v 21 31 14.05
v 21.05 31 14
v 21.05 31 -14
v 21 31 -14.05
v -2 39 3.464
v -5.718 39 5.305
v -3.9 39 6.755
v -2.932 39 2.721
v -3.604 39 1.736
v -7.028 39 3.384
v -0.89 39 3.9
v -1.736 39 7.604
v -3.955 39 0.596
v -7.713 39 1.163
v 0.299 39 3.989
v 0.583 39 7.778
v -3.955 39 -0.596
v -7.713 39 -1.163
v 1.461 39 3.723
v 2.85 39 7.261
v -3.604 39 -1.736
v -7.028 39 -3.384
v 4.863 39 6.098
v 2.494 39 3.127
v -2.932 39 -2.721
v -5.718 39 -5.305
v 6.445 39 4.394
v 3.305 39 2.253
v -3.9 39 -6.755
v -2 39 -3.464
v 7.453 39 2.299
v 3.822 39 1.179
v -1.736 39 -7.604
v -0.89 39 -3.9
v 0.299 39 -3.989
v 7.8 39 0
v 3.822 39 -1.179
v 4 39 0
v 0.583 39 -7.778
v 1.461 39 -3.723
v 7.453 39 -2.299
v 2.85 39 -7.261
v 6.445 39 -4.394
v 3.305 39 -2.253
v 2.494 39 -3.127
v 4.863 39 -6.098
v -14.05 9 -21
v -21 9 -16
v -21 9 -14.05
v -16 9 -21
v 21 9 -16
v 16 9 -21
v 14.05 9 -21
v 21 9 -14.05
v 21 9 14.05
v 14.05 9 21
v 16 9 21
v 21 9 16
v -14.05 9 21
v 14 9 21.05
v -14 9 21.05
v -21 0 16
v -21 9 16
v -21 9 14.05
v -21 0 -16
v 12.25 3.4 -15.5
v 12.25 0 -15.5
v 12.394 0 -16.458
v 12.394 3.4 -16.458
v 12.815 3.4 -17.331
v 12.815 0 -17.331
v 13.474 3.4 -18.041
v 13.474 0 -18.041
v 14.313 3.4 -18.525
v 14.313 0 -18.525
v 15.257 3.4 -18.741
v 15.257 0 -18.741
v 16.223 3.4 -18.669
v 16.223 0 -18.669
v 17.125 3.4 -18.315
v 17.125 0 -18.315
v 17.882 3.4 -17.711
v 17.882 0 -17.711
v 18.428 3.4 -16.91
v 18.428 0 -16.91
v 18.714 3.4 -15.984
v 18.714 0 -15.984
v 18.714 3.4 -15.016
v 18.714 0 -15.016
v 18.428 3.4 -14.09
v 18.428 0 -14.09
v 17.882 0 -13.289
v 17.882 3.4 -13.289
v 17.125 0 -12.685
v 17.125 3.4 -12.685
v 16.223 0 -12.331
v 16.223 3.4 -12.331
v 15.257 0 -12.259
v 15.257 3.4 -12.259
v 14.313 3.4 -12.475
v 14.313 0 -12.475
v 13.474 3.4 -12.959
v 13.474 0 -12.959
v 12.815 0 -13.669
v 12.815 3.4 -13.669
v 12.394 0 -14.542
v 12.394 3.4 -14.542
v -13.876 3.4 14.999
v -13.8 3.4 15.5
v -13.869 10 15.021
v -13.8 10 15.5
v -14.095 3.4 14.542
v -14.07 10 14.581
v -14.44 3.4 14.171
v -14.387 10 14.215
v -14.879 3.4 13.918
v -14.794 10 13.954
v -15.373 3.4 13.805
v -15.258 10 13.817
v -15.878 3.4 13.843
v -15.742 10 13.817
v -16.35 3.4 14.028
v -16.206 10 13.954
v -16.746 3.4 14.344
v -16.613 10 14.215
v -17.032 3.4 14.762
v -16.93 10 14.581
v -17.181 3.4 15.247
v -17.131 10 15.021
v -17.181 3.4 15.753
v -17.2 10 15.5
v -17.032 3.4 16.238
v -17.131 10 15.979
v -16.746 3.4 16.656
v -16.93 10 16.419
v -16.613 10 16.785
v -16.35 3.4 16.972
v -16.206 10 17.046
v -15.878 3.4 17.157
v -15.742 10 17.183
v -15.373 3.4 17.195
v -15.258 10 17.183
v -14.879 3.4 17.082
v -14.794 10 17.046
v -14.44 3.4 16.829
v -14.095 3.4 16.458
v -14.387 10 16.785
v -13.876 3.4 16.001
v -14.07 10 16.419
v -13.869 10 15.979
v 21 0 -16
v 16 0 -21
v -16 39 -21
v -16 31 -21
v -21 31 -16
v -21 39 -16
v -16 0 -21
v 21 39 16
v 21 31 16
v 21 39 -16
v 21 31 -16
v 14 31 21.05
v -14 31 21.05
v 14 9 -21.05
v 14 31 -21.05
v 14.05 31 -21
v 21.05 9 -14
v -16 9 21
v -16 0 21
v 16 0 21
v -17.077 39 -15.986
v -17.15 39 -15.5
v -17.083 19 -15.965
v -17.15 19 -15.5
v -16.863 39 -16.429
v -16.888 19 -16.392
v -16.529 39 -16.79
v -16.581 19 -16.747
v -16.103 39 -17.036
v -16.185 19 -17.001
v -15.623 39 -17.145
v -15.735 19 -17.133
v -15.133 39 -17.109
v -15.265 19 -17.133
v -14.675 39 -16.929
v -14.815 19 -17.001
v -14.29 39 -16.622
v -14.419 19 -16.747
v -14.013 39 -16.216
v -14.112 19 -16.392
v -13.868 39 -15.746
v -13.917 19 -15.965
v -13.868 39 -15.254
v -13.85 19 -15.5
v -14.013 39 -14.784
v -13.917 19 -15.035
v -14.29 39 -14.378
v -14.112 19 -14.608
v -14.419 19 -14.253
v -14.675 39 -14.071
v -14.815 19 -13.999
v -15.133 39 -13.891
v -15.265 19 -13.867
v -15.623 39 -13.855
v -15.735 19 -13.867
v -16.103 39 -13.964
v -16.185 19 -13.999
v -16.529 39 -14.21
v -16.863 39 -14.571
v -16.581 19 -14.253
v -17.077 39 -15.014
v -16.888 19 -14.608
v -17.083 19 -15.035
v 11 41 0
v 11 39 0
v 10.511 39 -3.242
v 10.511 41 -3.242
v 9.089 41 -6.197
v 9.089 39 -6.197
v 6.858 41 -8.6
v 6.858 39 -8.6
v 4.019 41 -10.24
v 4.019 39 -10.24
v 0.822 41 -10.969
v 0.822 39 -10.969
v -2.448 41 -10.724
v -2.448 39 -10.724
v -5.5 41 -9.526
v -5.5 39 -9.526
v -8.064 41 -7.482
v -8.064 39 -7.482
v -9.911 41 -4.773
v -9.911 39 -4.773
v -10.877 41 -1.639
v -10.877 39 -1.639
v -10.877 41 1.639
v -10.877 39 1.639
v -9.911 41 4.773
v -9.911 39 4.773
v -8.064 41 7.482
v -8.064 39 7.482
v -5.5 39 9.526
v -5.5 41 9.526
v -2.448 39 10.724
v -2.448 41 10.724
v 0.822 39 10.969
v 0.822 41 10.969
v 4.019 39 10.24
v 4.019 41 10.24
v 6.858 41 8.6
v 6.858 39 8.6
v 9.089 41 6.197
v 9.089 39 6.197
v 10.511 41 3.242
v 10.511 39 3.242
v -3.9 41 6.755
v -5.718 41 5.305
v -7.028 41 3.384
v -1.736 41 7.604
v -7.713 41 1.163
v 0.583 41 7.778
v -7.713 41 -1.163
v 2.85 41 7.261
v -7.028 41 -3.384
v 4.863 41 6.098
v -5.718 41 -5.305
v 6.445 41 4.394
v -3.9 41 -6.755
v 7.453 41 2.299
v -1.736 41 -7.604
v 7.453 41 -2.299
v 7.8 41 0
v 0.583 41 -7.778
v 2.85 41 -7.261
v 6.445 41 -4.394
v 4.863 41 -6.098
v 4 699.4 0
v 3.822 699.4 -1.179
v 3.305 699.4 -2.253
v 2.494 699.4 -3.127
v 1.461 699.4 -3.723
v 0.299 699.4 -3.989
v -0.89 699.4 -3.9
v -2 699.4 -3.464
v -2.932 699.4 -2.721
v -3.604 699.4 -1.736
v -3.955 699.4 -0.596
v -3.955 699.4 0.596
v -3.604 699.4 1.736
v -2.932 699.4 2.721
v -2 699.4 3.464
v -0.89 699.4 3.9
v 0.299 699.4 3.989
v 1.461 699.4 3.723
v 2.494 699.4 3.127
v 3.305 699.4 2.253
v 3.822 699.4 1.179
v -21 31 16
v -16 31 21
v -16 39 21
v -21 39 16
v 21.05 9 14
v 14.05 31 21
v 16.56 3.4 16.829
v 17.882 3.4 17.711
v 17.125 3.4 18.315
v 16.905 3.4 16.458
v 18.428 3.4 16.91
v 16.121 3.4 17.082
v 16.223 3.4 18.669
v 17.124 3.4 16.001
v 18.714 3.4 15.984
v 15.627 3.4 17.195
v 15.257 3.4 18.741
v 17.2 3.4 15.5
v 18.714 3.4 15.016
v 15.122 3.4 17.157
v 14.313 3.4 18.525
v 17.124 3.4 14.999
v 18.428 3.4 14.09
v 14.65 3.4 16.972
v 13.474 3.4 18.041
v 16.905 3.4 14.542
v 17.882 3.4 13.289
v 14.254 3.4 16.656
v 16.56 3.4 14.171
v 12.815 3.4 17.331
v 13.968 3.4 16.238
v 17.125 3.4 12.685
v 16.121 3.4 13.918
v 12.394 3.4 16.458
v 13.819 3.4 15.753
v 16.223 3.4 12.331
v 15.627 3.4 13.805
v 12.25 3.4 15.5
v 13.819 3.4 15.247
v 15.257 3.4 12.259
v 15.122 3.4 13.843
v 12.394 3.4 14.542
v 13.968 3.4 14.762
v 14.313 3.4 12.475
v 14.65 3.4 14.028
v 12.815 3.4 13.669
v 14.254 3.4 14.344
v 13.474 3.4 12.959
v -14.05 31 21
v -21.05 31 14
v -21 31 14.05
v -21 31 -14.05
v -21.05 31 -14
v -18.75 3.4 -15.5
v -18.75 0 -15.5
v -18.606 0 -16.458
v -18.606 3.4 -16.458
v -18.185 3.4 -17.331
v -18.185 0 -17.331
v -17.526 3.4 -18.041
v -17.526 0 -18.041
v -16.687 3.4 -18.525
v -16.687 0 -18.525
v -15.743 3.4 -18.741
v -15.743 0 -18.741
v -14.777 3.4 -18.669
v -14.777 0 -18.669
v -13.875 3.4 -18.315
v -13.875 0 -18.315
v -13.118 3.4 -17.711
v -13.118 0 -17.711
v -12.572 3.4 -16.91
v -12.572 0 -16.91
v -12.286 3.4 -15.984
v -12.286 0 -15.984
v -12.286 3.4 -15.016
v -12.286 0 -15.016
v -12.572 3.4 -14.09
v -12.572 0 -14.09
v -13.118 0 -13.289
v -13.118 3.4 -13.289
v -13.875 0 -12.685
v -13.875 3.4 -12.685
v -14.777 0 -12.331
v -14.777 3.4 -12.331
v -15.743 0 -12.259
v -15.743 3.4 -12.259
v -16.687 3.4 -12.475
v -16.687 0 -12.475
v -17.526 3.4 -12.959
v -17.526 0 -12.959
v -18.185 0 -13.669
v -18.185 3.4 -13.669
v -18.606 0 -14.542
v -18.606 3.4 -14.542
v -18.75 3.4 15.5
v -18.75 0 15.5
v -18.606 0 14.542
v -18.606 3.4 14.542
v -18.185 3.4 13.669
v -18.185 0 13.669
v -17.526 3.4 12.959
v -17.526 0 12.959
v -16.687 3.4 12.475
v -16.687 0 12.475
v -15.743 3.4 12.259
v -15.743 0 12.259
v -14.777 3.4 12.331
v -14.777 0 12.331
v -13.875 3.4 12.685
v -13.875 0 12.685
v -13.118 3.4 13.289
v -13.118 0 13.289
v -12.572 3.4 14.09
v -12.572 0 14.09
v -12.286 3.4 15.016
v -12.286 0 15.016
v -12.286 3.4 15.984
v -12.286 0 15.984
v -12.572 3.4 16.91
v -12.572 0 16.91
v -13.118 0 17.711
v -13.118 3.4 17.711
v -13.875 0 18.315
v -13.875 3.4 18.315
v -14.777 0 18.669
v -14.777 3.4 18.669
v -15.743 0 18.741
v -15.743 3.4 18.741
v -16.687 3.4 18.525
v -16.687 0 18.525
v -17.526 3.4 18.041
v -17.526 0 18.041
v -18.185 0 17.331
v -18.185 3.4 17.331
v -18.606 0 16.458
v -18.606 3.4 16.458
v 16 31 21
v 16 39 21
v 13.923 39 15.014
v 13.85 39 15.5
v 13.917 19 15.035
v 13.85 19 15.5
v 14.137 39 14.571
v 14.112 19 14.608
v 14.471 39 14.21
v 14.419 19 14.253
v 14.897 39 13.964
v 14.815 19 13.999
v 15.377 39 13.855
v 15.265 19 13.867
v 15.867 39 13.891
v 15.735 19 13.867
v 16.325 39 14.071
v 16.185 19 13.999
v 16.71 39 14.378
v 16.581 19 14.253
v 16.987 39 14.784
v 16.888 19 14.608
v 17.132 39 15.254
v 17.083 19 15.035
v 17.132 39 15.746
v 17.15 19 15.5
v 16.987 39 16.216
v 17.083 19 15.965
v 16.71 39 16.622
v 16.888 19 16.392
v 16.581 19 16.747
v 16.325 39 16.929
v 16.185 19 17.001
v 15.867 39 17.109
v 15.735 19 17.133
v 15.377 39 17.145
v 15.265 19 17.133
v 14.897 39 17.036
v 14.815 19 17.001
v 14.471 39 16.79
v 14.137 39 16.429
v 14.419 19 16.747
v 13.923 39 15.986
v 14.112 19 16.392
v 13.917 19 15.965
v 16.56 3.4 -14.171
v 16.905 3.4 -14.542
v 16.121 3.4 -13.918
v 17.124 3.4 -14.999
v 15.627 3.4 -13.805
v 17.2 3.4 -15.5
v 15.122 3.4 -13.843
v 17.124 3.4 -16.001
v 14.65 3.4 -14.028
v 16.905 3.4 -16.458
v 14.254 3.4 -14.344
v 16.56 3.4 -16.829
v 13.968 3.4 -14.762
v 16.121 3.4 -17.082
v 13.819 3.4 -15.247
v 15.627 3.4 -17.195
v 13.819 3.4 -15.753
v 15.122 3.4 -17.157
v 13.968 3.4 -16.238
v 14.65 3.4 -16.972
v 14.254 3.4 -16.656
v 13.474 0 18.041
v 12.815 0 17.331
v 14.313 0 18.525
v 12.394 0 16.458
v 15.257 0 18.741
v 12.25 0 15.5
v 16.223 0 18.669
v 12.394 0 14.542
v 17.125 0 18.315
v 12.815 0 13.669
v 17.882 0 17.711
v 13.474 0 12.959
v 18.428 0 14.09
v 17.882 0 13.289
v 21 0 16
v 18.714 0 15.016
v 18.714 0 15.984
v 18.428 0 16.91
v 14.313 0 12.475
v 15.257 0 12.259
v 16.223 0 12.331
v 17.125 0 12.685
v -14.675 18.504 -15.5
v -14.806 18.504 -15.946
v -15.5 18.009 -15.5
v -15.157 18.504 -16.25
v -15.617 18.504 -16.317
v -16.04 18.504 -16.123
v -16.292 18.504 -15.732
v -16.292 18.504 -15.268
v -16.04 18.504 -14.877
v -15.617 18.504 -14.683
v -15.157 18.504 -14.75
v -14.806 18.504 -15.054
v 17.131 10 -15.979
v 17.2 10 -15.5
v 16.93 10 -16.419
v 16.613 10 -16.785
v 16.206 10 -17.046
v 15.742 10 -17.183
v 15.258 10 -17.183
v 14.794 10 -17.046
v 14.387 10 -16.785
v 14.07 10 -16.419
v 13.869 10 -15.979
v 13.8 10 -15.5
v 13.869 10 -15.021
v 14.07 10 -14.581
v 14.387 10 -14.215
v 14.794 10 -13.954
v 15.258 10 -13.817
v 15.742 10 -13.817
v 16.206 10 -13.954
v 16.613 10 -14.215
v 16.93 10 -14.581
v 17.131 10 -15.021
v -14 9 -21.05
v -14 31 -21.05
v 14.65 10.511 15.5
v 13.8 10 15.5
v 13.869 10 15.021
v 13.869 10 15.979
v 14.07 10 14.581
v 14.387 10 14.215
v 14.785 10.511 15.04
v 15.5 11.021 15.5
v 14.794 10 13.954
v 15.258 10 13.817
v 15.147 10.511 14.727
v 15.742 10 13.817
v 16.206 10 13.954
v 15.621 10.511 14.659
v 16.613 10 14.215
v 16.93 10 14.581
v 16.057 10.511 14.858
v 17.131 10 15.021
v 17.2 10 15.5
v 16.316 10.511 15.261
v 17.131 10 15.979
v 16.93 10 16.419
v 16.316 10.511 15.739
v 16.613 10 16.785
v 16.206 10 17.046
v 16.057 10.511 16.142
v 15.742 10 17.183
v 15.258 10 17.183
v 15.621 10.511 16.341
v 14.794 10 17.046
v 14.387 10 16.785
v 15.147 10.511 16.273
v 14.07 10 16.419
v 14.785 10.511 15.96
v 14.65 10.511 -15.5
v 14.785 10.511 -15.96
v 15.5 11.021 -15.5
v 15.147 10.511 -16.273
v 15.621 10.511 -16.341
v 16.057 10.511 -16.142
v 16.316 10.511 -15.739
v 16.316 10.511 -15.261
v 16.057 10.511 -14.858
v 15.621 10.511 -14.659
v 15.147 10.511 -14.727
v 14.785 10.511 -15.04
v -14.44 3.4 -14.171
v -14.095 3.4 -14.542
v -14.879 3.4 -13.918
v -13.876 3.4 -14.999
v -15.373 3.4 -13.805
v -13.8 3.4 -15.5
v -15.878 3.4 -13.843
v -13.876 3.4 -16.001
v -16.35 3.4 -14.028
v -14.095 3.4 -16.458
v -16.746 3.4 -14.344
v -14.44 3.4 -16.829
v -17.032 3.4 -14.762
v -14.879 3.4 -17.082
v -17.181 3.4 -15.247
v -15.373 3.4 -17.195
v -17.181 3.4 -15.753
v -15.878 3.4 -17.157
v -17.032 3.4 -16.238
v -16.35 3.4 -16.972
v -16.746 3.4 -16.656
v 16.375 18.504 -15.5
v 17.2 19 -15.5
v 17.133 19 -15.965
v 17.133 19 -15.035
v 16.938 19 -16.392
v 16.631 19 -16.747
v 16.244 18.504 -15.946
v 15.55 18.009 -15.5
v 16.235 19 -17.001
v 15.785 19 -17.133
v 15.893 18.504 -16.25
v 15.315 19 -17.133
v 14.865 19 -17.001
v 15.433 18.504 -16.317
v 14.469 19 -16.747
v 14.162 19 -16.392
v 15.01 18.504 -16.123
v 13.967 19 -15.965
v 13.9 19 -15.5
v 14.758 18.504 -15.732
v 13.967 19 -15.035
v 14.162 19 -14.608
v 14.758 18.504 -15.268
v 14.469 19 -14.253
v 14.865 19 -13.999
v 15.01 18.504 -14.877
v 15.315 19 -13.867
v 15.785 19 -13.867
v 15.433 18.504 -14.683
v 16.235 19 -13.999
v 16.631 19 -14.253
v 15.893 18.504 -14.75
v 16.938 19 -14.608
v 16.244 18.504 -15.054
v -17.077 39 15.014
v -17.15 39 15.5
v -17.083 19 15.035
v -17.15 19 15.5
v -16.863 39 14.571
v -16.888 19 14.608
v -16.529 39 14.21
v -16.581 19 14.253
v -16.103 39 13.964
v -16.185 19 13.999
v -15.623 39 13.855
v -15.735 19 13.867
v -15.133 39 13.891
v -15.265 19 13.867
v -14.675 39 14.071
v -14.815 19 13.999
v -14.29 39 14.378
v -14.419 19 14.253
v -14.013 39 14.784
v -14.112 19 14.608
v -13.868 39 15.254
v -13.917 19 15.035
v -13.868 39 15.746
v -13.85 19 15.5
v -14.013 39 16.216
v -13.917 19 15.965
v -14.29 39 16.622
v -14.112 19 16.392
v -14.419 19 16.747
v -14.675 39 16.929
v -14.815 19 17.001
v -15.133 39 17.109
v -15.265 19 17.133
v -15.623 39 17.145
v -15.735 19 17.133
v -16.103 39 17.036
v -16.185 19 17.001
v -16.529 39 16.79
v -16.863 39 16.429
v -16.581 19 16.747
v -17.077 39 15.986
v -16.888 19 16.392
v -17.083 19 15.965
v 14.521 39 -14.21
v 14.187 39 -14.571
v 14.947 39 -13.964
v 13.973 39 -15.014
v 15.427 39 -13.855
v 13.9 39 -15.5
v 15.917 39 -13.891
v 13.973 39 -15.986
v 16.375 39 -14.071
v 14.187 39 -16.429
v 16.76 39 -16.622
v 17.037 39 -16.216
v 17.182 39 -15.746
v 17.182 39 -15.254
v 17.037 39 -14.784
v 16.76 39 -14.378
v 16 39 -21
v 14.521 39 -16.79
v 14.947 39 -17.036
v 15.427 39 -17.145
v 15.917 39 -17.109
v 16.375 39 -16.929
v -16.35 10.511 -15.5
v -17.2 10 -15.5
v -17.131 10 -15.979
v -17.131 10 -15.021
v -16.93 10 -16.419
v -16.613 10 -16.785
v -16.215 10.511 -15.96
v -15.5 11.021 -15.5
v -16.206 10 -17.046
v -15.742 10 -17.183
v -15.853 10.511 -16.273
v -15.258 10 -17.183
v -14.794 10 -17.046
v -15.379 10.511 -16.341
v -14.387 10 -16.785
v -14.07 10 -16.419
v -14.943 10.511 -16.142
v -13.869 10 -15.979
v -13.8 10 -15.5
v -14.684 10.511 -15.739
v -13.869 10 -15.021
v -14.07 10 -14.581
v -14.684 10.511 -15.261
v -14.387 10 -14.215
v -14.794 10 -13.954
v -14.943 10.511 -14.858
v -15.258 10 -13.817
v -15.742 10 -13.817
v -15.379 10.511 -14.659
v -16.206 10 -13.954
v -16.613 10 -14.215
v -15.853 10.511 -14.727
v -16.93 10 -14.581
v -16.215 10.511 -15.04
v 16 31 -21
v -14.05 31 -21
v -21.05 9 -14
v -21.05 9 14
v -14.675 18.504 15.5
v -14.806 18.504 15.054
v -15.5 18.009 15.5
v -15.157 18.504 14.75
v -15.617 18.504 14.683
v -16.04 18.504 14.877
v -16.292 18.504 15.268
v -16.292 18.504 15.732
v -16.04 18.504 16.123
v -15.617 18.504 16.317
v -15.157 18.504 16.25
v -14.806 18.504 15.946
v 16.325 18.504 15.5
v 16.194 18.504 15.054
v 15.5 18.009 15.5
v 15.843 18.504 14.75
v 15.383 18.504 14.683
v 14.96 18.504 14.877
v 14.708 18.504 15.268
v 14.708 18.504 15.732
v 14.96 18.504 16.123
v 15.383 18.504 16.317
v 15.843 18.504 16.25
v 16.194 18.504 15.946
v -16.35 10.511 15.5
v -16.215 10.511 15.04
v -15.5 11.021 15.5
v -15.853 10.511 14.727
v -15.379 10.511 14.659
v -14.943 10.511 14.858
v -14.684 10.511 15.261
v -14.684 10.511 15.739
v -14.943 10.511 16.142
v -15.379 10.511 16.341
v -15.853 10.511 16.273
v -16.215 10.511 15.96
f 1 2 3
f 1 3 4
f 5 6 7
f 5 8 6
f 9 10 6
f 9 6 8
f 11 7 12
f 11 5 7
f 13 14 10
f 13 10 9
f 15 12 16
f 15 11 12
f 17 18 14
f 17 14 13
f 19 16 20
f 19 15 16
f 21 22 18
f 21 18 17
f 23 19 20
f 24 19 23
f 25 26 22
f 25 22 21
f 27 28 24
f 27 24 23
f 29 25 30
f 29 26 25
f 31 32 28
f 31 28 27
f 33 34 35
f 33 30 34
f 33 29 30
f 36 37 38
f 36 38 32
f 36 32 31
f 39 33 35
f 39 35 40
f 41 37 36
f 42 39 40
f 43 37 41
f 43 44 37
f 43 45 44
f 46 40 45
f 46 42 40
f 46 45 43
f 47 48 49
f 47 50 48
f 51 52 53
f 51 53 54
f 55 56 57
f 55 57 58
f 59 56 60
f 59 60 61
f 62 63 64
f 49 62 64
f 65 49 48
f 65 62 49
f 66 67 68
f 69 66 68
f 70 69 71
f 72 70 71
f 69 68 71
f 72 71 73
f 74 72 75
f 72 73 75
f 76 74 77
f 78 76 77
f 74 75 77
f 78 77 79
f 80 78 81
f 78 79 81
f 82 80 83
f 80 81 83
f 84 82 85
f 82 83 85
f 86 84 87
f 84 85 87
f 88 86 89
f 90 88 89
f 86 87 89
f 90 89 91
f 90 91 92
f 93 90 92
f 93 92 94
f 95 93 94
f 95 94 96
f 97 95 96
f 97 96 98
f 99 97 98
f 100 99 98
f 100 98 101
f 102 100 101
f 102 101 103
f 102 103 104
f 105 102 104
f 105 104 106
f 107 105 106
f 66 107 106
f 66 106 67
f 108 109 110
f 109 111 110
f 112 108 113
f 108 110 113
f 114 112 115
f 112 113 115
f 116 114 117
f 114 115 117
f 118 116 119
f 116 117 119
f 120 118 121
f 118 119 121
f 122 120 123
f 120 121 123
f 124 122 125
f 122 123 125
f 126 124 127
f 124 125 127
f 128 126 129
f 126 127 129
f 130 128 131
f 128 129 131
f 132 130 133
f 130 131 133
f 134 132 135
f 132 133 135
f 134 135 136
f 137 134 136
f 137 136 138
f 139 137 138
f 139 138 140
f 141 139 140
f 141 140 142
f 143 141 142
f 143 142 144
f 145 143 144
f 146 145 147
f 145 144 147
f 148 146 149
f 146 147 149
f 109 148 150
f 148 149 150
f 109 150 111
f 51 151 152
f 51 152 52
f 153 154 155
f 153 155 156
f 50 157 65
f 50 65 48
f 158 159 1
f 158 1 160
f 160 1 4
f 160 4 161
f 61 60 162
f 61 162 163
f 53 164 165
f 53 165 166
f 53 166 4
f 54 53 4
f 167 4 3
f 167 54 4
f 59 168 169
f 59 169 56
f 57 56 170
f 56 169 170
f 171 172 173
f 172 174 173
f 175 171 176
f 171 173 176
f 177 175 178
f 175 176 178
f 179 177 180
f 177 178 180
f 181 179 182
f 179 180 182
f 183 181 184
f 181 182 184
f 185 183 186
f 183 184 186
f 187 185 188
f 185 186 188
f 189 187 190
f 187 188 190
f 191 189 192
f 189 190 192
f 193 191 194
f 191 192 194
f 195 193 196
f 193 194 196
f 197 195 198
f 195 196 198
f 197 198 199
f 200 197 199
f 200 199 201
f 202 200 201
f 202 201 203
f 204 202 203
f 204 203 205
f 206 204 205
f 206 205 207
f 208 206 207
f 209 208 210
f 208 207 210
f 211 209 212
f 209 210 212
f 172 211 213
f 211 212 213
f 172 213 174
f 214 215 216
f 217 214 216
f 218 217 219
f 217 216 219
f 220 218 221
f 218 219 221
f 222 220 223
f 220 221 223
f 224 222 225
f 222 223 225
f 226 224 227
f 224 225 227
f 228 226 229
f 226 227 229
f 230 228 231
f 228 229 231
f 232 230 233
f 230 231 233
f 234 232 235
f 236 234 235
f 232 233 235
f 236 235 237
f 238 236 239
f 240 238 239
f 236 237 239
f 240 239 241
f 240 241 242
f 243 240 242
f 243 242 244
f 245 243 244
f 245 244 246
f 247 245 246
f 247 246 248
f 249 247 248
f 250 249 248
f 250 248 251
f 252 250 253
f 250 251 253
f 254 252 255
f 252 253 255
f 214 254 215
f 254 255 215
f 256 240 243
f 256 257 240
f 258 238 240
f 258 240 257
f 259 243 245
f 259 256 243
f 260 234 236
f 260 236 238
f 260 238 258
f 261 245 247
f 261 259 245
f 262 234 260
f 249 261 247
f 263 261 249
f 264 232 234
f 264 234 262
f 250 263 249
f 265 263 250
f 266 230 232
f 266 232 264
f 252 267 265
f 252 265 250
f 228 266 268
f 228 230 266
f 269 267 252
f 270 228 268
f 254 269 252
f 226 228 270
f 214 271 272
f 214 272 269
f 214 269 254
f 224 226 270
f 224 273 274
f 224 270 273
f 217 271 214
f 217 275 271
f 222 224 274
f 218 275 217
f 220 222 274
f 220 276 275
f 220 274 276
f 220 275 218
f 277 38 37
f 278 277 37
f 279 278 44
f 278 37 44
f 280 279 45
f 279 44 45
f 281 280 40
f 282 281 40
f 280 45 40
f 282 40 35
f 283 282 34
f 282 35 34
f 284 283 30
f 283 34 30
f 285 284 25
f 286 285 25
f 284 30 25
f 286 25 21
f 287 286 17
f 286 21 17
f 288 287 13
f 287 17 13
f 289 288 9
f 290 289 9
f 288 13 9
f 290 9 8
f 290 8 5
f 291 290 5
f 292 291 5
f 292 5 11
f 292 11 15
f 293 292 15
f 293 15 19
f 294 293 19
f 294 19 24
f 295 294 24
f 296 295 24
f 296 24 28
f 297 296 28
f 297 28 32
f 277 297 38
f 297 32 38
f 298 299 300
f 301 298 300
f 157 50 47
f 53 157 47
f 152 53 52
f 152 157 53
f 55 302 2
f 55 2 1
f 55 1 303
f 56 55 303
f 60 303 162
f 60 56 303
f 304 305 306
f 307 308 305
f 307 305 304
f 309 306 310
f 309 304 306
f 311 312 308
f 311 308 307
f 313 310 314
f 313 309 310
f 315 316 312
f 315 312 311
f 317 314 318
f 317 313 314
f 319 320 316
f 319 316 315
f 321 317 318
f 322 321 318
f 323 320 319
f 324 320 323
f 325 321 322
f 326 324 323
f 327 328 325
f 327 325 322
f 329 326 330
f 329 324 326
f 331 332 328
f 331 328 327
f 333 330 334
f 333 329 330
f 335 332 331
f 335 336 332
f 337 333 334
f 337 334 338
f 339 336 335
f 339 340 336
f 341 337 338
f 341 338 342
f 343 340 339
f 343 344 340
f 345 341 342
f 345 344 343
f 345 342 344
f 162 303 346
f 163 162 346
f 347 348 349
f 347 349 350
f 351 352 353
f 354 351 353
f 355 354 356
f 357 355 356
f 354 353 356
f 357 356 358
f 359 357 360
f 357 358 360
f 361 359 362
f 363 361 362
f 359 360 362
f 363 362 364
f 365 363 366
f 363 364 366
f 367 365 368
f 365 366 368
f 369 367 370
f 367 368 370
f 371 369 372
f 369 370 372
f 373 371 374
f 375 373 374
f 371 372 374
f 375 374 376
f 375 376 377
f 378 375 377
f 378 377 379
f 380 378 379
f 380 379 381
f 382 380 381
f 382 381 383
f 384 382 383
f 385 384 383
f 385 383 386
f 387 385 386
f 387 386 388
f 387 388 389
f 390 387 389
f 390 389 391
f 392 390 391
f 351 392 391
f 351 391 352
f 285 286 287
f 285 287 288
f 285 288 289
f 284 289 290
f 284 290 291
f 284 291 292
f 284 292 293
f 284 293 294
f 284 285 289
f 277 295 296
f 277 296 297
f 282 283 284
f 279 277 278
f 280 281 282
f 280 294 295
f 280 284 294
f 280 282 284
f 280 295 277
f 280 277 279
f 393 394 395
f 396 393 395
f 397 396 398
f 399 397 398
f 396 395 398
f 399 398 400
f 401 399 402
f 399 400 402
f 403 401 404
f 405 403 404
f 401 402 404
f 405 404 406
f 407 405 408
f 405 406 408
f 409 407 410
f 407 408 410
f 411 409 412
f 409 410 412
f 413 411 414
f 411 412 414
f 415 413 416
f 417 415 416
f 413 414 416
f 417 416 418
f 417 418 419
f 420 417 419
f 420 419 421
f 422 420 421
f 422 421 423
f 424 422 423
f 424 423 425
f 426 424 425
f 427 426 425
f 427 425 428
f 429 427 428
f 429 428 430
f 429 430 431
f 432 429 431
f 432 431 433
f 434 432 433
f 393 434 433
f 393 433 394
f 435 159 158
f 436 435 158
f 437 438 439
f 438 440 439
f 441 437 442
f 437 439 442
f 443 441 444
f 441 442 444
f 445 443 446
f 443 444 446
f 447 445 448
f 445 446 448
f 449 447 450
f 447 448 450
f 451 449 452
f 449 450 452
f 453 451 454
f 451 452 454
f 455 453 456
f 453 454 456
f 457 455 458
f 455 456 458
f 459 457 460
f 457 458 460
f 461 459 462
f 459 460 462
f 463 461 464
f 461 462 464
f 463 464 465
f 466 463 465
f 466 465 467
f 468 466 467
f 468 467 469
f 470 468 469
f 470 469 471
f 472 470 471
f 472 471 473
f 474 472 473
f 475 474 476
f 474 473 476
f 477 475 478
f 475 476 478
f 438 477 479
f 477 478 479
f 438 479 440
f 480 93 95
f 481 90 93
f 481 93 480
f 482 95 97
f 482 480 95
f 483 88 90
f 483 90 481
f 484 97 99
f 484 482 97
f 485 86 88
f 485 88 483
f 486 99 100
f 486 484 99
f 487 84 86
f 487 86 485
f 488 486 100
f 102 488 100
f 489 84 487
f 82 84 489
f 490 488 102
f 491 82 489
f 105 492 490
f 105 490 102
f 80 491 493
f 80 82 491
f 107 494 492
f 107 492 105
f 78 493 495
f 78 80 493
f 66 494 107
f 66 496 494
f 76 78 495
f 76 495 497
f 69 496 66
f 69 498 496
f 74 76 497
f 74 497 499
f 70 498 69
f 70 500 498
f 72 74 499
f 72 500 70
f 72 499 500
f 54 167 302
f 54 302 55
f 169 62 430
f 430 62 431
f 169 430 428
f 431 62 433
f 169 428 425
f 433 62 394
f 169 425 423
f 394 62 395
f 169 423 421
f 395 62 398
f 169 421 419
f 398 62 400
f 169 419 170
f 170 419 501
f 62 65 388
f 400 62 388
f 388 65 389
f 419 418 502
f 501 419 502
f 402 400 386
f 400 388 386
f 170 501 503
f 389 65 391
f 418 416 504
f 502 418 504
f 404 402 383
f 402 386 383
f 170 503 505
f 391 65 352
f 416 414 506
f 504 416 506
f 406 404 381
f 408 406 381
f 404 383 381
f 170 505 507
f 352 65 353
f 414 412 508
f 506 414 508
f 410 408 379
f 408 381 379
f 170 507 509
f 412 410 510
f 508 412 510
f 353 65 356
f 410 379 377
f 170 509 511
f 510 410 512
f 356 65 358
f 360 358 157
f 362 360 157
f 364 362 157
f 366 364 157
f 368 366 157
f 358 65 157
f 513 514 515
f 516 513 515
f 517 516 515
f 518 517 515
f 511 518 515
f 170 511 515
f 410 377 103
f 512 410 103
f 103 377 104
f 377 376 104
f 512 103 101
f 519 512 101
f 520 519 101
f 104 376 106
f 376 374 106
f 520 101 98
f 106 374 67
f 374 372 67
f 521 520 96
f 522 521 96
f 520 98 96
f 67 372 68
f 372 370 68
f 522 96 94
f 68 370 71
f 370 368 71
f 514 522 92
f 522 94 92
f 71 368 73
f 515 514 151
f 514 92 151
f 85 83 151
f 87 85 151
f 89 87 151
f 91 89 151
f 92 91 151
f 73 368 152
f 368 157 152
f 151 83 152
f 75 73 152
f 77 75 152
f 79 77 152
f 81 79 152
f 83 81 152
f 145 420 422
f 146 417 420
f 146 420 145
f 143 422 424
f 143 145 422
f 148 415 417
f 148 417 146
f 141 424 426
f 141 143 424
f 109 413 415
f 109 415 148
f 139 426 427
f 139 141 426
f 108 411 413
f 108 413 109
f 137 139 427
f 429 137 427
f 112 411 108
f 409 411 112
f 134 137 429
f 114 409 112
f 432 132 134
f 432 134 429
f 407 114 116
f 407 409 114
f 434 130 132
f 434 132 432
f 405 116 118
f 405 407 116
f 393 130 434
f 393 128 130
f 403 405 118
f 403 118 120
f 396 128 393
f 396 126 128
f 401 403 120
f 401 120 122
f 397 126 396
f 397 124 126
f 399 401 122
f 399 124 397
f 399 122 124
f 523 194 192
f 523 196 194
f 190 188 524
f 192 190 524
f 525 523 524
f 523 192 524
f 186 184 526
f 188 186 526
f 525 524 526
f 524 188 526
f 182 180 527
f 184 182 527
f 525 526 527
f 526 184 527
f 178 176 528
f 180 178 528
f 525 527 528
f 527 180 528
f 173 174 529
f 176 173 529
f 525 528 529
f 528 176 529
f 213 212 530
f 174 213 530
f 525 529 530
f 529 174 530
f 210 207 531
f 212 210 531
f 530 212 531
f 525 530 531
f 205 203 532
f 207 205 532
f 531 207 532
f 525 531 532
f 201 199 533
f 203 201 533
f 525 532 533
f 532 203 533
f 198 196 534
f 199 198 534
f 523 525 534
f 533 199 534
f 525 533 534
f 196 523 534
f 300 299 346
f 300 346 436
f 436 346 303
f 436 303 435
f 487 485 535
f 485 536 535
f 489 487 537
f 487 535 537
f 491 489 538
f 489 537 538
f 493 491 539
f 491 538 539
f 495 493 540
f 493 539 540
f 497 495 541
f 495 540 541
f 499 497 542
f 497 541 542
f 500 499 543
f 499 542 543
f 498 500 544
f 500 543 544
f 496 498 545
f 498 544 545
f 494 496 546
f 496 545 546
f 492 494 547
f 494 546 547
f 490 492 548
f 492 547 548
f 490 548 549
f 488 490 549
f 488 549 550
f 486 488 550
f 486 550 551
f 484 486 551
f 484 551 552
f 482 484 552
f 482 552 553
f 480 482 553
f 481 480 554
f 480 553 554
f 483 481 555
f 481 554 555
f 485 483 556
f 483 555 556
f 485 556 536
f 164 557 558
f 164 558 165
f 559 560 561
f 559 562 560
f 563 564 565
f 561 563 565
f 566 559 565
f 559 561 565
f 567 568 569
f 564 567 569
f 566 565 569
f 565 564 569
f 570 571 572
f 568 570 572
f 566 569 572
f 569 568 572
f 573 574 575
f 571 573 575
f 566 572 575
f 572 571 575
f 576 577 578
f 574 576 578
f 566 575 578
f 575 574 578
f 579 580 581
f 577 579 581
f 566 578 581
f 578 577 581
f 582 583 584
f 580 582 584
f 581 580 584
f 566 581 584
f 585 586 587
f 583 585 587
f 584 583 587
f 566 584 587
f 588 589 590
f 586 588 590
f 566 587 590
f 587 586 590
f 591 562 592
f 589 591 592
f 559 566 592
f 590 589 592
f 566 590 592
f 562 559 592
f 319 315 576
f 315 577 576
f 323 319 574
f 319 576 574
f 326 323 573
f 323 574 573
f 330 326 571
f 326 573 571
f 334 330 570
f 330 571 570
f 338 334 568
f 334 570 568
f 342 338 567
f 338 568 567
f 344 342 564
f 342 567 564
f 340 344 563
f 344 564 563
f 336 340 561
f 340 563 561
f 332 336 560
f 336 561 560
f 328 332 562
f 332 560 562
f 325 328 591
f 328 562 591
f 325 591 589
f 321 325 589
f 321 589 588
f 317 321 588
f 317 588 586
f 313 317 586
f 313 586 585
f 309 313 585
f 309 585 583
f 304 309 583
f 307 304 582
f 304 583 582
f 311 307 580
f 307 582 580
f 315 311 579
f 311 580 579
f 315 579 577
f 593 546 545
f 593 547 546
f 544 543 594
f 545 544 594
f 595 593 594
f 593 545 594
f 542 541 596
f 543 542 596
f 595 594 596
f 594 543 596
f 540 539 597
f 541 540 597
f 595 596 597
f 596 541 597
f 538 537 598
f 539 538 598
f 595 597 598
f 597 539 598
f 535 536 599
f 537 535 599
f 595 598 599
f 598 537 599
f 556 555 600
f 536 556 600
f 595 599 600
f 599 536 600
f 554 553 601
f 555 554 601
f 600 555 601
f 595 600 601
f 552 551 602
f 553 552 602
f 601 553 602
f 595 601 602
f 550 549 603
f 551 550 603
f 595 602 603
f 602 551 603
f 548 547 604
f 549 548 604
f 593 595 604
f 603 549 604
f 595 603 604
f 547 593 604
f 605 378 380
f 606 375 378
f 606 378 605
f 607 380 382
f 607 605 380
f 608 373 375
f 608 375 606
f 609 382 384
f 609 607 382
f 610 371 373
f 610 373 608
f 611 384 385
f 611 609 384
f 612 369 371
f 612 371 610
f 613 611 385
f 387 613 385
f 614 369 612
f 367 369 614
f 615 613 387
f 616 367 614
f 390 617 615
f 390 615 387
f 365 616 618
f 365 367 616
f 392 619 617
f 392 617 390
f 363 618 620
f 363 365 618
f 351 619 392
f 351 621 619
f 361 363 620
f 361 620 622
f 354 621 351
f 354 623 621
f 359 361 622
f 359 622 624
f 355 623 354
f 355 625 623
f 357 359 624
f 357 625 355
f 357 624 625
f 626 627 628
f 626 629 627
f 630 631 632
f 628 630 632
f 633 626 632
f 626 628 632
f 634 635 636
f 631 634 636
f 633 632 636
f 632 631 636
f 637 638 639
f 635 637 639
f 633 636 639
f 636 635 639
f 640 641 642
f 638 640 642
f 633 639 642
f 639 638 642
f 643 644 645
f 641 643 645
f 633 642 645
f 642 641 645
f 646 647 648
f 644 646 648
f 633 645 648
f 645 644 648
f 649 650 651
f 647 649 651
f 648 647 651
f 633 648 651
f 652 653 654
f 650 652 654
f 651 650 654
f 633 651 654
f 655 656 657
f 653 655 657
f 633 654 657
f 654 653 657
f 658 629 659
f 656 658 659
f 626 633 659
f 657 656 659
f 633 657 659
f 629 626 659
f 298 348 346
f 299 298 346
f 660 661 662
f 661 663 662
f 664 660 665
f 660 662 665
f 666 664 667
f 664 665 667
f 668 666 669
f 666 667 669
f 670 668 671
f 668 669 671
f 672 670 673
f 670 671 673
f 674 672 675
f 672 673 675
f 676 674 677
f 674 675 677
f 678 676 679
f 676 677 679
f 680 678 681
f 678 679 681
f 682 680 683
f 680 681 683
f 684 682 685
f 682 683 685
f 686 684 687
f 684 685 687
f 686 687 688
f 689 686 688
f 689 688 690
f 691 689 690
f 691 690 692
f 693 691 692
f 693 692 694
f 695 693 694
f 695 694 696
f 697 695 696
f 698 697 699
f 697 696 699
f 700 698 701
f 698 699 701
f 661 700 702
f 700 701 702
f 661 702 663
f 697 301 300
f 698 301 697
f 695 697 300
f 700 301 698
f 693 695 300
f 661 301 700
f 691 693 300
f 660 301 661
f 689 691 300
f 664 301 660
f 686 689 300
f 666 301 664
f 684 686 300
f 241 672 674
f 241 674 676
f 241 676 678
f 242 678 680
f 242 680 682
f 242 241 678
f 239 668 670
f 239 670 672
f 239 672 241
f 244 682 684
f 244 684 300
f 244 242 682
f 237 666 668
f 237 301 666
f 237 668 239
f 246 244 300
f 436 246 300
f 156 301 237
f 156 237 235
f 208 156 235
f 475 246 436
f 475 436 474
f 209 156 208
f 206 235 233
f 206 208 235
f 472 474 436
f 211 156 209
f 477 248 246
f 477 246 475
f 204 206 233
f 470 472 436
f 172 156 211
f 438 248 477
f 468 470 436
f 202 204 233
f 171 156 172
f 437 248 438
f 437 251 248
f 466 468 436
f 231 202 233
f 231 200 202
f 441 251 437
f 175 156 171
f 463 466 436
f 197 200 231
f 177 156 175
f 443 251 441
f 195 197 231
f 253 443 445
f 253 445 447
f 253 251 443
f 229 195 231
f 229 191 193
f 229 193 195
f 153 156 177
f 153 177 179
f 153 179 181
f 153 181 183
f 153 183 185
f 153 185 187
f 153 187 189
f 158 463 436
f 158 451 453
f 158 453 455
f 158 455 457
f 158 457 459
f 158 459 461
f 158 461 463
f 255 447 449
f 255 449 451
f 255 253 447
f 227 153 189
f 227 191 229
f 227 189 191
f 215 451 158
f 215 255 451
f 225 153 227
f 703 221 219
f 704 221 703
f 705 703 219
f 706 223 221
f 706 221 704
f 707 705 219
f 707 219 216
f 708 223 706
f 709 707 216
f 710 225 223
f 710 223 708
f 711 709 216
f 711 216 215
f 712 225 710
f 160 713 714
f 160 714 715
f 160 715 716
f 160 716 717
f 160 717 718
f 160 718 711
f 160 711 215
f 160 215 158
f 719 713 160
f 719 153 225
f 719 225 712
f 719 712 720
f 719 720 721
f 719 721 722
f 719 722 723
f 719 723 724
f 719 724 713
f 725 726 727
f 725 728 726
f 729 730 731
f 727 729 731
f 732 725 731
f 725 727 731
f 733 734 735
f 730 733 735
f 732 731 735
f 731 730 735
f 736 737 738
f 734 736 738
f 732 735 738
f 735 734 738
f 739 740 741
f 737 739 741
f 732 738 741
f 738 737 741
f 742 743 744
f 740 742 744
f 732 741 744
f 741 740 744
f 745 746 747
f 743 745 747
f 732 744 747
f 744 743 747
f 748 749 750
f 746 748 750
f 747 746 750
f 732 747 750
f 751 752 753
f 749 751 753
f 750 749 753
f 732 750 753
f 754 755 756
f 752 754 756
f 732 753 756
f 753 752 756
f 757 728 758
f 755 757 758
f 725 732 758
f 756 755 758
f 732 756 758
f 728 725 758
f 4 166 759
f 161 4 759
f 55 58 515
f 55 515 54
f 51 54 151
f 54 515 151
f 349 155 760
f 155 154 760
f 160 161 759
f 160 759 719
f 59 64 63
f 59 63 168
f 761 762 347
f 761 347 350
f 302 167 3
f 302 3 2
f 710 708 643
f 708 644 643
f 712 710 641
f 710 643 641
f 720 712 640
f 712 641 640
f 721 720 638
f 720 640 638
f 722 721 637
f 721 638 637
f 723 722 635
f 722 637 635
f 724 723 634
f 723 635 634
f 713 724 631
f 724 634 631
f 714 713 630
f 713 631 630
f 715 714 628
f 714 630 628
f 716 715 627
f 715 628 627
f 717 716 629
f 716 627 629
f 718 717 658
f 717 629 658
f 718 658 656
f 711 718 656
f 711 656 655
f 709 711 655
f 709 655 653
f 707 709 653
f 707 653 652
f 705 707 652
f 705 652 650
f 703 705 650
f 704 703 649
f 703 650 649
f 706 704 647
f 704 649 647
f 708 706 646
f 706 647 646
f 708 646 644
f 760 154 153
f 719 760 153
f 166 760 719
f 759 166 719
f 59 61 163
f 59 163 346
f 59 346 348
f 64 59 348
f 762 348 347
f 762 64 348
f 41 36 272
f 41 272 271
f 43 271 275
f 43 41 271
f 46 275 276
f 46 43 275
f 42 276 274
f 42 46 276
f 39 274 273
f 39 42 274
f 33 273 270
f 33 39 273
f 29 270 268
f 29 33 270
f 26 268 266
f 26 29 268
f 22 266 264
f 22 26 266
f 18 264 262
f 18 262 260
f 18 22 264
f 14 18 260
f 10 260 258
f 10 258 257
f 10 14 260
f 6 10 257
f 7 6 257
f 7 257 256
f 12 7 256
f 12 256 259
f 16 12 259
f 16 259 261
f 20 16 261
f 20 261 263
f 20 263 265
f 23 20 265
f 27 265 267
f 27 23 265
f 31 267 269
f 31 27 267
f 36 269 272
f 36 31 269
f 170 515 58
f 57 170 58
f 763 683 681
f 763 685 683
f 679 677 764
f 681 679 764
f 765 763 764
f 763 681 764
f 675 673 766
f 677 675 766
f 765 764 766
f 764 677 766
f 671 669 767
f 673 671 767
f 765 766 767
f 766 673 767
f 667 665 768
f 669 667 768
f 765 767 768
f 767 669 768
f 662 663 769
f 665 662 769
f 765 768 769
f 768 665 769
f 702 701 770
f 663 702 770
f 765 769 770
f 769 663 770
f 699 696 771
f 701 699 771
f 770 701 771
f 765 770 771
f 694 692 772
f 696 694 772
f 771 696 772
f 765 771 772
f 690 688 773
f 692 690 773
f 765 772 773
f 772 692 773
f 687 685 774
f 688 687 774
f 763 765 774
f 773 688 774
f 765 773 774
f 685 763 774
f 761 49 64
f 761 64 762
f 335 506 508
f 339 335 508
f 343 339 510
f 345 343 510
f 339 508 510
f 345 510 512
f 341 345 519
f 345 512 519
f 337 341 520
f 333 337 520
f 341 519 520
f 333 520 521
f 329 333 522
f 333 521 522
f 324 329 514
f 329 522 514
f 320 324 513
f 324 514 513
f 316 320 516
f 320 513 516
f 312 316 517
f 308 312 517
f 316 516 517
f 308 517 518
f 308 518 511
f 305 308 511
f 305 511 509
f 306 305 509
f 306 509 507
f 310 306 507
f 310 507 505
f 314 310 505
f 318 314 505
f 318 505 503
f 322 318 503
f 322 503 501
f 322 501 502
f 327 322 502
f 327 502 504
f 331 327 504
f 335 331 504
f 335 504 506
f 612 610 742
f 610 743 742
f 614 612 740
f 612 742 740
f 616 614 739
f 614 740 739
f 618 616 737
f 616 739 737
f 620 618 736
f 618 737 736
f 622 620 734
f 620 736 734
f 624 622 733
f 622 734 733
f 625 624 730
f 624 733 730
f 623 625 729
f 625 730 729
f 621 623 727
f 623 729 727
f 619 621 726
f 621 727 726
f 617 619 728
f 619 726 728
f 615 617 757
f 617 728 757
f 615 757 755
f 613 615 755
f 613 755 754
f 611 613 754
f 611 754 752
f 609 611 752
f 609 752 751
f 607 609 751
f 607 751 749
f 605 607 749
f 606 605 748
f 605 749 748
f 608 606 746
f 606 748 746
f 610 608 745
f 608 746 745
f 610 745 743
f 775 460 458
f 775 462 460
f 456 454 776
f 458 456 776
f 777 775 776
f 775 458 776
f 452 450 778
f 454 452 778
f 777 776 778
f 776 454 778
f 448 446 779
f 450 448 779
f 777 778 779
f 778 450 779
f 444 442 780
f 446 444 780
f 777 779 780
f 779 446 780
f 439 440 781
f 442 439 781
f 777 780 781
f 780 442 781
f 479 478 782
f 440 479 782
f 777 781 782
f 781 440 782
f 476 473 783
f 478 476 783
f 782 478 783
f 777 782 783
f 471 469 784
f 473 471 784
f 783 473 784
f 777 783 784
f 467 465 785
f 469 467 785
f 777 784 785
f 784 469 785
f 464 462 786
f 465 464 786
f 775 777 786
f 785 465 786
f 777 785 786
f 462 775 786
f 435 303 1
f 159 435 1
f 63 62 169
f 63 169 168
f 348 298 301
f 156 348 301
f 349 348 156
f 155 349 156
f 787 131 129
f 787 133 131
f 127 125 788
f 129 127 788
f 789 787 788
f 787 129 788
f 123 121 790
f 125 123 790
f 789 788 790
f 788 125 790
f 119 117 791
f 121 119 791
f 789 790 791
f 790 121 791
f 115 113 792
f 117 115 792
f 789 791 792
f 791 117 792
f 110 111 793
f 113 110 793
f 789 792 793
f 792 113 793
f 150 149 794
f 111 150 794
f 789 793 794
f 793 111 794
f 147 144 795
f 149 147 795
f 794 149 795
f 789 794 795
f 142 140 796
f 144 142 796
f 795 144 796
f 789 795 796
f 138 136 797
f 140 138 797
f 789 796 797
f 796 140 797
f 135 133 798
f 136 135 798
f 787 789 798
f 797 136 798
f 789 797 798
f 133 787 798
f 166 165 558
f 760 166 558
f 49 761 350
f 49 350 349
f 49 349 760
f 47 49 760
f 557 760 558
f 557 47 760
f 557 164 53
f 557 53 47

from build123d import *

# Parameters (mm, degrees)
ESBO_O1_W                                            = 42
ESBO_O1_H                                            = 42
RESSALTO_EXTRUS_O1_DEPTH                             = 9
RESSALTO_EXTRUS_O2_DEPTH                             = 22
ESBO_O3_W                                            = 42
ESBO_O3_H                                            = 42
RESSALTO_EXTRUS_O3_DEPTH                             = 8
ESBO_O4_R                                            = 11
ESBO_O4_R_2                                          = 7.8
RESSALTO_EXTRUS_O4_DEPTH                             = 2
BROCA_DE_ROSQUEAR_PARA_TARRAXA_DE_M41_D              = 3.3
BROCA_DE_ROSQUEAR_PARA_TARRAXA_DE_M41_DEPTH          = 20
BROCA_DE_ROSQUEAR_PARA_TARRAXA_DE_M41_TIP            = 0.991420021
CHANFRO1_SIZE                                        = 5
REBAIXO_PARA_PARAFUSO_ALLEN_SEXTAVADO_DE_D           = 3.4
REBAIXO_PARA_PARAFUSO_ALLEN_SEXTAVADO_DE_DEPTH       = 10
REBAIXO_PARA_PARAFUSO_ALLEN_SEXTAVADO_DE_CBORE_D     = 6.5
REBAIXO_PARA_PARAFUSO_ALLEN_SEXTAVADO_DE_CBORE_DEPTH = 3.4
REBAIXO_PARA_PARAFUSO_ALLEN_SEXTAVADO_DE_TIP         = 1.021463052
ESBO_O10_R                                           = 4
BOSS_EXTRUDE1_DEPTH                                  = 660.4


with BuildPart() as part:
    # Esboço1 → Ressalto-extrusão1 (new body)
    with BuildSketch(Plane(origin=(0, 0, 0), x_dir=(1, 0, 0), z_dir=(0, 1, 0))):
        Rectangle(ESBO_O1_W, ESBO_O1_H)
    extrude(amount=RESSALTO_EXTRUS_O1_DEPTH)

    # Esboço2 → Ressalto-extrusão2 (add)
    with BuildSketch(Plane(origin=(0, 9, 0), x_dir=(1, 0, 0), z_dir=(0, 1, 0))):
        Polygon((14, 21.05), (21.05, 14), (21.05, -14), (14, -21.05), (-14, -21.05), (-21.05, -14), (-21.05, 14), (-14, 21.05), align=None)
    extrude(amount=RESSALTO_EXTRUS_O2_DEPTH)

    # Esboço3 → Ressalto-extrusão3 (add)
    with BuildSketch(Plane(origin=(0, 31, 0), x_dir=(1, 0, 0), z_dir=(0, 1, 0))):
        Rectangle(ESBO_O3_W, ESBO_O3_H)
    extrude(amount=RESSALTO_EXTRUS_O3_DEPTH)

    # Esboço4 → Ressalto-extrusão4 (add)
    with BuildSketch(Plane(origin=(0, 39, 0), x_dir=(1, 0, 0), z_dir=(0, 1, 0))):
        Circle(ESBO_O4_R)
        Circle(ESBO_O4_R_2, mode=Mode.SUBTRACT)
    extrude(amount=RESSALTO_EXTRUS_O4_DEPTH)

    # Broca de rosquear para tarraxa de M41
    with Locations(Plane(origin=(0, 39, 0), x_dir=(1, 0, 0), z_dir=(0, 1, 0))):
        with Locations((-15.5, -15.5), (-15.5, 15.5), (15.55, 15.5), (15.5, -15.5)):
            Hole(BROCA_DE_ROSQUEAR_PARA_TARRAXA_DE_M41_D / 2, depth=BROCA_DE_ROSQUEAR_PARA_TARRAXA_DE_M41_DEPTH)
            with Locations((0, 0, -(BROCA_DE_ROSQUEAR_PARA_TARRAXA_DE_M41_DEPTH + BROCA_DE_ROSQUEAR_PARA_TARRAXA_DE_M41_TIP / 2))):  # 118° drill point
                Cone(0, BROCA_DE_ROSQUEAR_PARA_TARRAXA_DE_M41_D / 2, BROCA_DE_ROSQUEAR_PARA_TARRAXA_DE_M41_TIP, mode=Mode.SUBTRACT)

    # Chanfro1
    chanfro1_edges = [part.edges().sort_by_distance(p)[0] for p in [
        (-21, 35, -21),
        (-21, 35, 21),
        (21, 35, 21),
        (21, 35, -21),
        (21, 4.5, -21),
        (-21, 4.5, -21),
        (-21, 4.5, 21),
        (21, 4.5, 21),
    ]]
    chamfer(chanfro1_edges, length=CHANFRO1_SIZE)

    # Rebaixo para parafuso Allen sextavado de M31
    with Locations(Plane(origin=(0, 0, 0), x_dir=(-1, 0, 0), z_dir=(0, -1, 0))):
        with Locations((-15.5, 15.5), (15.5, 15.5), (15.5, -15.5), (-15.5, -15.5)):
            CounterBoreHole(REBAIXO_PARA_PARAFUSO_ALLEN_SEXTAVADO_DE_D / 2, REBAIXO_PARA_PARAFUSO_ALLEN_SEXTAVADO_DE_CBORE_D / 2, REBAIXO_PARA_PARAFUSO_ALLEN_SEXTAVADO_DE_CBORE_DEPTH, depth=REBAIXO_PARA_PARAFUSO_ALLEN_SEXTAVADO_DE_DEPTH)
            with Locations((0, 0, -(REBAIXO_PARA_PARAFUSO_ALLEN_SEXTAVADO_DE_DEPTH + REBAIXO_PARA_PARAFUSO_ALLEN_SEXTAVADO_DE_TIP / 2))):  # 118° drill point
                Cone(0, REBAIXO_PARA_PARAFUSO_ALLEN_SEXTAVADO_DE_D / 2, REBAIXO_PARA_PARAFUSO_ALLEN_SEXTAVADO_DE_TIP, mode=Mode.SUBTRACT)

    # Esboço10 → Boss-Extrude1 (add)
    with BuildSketch(Plane(origin=(0, 39, 0), x_dir=(1, 0, 0), z_dir=(0, 1, 0))):
        Circle(ESBO_O10_R)
    extrude(amount=BOSS_EXTRUDE1_DEPTH)


solid = part.part
